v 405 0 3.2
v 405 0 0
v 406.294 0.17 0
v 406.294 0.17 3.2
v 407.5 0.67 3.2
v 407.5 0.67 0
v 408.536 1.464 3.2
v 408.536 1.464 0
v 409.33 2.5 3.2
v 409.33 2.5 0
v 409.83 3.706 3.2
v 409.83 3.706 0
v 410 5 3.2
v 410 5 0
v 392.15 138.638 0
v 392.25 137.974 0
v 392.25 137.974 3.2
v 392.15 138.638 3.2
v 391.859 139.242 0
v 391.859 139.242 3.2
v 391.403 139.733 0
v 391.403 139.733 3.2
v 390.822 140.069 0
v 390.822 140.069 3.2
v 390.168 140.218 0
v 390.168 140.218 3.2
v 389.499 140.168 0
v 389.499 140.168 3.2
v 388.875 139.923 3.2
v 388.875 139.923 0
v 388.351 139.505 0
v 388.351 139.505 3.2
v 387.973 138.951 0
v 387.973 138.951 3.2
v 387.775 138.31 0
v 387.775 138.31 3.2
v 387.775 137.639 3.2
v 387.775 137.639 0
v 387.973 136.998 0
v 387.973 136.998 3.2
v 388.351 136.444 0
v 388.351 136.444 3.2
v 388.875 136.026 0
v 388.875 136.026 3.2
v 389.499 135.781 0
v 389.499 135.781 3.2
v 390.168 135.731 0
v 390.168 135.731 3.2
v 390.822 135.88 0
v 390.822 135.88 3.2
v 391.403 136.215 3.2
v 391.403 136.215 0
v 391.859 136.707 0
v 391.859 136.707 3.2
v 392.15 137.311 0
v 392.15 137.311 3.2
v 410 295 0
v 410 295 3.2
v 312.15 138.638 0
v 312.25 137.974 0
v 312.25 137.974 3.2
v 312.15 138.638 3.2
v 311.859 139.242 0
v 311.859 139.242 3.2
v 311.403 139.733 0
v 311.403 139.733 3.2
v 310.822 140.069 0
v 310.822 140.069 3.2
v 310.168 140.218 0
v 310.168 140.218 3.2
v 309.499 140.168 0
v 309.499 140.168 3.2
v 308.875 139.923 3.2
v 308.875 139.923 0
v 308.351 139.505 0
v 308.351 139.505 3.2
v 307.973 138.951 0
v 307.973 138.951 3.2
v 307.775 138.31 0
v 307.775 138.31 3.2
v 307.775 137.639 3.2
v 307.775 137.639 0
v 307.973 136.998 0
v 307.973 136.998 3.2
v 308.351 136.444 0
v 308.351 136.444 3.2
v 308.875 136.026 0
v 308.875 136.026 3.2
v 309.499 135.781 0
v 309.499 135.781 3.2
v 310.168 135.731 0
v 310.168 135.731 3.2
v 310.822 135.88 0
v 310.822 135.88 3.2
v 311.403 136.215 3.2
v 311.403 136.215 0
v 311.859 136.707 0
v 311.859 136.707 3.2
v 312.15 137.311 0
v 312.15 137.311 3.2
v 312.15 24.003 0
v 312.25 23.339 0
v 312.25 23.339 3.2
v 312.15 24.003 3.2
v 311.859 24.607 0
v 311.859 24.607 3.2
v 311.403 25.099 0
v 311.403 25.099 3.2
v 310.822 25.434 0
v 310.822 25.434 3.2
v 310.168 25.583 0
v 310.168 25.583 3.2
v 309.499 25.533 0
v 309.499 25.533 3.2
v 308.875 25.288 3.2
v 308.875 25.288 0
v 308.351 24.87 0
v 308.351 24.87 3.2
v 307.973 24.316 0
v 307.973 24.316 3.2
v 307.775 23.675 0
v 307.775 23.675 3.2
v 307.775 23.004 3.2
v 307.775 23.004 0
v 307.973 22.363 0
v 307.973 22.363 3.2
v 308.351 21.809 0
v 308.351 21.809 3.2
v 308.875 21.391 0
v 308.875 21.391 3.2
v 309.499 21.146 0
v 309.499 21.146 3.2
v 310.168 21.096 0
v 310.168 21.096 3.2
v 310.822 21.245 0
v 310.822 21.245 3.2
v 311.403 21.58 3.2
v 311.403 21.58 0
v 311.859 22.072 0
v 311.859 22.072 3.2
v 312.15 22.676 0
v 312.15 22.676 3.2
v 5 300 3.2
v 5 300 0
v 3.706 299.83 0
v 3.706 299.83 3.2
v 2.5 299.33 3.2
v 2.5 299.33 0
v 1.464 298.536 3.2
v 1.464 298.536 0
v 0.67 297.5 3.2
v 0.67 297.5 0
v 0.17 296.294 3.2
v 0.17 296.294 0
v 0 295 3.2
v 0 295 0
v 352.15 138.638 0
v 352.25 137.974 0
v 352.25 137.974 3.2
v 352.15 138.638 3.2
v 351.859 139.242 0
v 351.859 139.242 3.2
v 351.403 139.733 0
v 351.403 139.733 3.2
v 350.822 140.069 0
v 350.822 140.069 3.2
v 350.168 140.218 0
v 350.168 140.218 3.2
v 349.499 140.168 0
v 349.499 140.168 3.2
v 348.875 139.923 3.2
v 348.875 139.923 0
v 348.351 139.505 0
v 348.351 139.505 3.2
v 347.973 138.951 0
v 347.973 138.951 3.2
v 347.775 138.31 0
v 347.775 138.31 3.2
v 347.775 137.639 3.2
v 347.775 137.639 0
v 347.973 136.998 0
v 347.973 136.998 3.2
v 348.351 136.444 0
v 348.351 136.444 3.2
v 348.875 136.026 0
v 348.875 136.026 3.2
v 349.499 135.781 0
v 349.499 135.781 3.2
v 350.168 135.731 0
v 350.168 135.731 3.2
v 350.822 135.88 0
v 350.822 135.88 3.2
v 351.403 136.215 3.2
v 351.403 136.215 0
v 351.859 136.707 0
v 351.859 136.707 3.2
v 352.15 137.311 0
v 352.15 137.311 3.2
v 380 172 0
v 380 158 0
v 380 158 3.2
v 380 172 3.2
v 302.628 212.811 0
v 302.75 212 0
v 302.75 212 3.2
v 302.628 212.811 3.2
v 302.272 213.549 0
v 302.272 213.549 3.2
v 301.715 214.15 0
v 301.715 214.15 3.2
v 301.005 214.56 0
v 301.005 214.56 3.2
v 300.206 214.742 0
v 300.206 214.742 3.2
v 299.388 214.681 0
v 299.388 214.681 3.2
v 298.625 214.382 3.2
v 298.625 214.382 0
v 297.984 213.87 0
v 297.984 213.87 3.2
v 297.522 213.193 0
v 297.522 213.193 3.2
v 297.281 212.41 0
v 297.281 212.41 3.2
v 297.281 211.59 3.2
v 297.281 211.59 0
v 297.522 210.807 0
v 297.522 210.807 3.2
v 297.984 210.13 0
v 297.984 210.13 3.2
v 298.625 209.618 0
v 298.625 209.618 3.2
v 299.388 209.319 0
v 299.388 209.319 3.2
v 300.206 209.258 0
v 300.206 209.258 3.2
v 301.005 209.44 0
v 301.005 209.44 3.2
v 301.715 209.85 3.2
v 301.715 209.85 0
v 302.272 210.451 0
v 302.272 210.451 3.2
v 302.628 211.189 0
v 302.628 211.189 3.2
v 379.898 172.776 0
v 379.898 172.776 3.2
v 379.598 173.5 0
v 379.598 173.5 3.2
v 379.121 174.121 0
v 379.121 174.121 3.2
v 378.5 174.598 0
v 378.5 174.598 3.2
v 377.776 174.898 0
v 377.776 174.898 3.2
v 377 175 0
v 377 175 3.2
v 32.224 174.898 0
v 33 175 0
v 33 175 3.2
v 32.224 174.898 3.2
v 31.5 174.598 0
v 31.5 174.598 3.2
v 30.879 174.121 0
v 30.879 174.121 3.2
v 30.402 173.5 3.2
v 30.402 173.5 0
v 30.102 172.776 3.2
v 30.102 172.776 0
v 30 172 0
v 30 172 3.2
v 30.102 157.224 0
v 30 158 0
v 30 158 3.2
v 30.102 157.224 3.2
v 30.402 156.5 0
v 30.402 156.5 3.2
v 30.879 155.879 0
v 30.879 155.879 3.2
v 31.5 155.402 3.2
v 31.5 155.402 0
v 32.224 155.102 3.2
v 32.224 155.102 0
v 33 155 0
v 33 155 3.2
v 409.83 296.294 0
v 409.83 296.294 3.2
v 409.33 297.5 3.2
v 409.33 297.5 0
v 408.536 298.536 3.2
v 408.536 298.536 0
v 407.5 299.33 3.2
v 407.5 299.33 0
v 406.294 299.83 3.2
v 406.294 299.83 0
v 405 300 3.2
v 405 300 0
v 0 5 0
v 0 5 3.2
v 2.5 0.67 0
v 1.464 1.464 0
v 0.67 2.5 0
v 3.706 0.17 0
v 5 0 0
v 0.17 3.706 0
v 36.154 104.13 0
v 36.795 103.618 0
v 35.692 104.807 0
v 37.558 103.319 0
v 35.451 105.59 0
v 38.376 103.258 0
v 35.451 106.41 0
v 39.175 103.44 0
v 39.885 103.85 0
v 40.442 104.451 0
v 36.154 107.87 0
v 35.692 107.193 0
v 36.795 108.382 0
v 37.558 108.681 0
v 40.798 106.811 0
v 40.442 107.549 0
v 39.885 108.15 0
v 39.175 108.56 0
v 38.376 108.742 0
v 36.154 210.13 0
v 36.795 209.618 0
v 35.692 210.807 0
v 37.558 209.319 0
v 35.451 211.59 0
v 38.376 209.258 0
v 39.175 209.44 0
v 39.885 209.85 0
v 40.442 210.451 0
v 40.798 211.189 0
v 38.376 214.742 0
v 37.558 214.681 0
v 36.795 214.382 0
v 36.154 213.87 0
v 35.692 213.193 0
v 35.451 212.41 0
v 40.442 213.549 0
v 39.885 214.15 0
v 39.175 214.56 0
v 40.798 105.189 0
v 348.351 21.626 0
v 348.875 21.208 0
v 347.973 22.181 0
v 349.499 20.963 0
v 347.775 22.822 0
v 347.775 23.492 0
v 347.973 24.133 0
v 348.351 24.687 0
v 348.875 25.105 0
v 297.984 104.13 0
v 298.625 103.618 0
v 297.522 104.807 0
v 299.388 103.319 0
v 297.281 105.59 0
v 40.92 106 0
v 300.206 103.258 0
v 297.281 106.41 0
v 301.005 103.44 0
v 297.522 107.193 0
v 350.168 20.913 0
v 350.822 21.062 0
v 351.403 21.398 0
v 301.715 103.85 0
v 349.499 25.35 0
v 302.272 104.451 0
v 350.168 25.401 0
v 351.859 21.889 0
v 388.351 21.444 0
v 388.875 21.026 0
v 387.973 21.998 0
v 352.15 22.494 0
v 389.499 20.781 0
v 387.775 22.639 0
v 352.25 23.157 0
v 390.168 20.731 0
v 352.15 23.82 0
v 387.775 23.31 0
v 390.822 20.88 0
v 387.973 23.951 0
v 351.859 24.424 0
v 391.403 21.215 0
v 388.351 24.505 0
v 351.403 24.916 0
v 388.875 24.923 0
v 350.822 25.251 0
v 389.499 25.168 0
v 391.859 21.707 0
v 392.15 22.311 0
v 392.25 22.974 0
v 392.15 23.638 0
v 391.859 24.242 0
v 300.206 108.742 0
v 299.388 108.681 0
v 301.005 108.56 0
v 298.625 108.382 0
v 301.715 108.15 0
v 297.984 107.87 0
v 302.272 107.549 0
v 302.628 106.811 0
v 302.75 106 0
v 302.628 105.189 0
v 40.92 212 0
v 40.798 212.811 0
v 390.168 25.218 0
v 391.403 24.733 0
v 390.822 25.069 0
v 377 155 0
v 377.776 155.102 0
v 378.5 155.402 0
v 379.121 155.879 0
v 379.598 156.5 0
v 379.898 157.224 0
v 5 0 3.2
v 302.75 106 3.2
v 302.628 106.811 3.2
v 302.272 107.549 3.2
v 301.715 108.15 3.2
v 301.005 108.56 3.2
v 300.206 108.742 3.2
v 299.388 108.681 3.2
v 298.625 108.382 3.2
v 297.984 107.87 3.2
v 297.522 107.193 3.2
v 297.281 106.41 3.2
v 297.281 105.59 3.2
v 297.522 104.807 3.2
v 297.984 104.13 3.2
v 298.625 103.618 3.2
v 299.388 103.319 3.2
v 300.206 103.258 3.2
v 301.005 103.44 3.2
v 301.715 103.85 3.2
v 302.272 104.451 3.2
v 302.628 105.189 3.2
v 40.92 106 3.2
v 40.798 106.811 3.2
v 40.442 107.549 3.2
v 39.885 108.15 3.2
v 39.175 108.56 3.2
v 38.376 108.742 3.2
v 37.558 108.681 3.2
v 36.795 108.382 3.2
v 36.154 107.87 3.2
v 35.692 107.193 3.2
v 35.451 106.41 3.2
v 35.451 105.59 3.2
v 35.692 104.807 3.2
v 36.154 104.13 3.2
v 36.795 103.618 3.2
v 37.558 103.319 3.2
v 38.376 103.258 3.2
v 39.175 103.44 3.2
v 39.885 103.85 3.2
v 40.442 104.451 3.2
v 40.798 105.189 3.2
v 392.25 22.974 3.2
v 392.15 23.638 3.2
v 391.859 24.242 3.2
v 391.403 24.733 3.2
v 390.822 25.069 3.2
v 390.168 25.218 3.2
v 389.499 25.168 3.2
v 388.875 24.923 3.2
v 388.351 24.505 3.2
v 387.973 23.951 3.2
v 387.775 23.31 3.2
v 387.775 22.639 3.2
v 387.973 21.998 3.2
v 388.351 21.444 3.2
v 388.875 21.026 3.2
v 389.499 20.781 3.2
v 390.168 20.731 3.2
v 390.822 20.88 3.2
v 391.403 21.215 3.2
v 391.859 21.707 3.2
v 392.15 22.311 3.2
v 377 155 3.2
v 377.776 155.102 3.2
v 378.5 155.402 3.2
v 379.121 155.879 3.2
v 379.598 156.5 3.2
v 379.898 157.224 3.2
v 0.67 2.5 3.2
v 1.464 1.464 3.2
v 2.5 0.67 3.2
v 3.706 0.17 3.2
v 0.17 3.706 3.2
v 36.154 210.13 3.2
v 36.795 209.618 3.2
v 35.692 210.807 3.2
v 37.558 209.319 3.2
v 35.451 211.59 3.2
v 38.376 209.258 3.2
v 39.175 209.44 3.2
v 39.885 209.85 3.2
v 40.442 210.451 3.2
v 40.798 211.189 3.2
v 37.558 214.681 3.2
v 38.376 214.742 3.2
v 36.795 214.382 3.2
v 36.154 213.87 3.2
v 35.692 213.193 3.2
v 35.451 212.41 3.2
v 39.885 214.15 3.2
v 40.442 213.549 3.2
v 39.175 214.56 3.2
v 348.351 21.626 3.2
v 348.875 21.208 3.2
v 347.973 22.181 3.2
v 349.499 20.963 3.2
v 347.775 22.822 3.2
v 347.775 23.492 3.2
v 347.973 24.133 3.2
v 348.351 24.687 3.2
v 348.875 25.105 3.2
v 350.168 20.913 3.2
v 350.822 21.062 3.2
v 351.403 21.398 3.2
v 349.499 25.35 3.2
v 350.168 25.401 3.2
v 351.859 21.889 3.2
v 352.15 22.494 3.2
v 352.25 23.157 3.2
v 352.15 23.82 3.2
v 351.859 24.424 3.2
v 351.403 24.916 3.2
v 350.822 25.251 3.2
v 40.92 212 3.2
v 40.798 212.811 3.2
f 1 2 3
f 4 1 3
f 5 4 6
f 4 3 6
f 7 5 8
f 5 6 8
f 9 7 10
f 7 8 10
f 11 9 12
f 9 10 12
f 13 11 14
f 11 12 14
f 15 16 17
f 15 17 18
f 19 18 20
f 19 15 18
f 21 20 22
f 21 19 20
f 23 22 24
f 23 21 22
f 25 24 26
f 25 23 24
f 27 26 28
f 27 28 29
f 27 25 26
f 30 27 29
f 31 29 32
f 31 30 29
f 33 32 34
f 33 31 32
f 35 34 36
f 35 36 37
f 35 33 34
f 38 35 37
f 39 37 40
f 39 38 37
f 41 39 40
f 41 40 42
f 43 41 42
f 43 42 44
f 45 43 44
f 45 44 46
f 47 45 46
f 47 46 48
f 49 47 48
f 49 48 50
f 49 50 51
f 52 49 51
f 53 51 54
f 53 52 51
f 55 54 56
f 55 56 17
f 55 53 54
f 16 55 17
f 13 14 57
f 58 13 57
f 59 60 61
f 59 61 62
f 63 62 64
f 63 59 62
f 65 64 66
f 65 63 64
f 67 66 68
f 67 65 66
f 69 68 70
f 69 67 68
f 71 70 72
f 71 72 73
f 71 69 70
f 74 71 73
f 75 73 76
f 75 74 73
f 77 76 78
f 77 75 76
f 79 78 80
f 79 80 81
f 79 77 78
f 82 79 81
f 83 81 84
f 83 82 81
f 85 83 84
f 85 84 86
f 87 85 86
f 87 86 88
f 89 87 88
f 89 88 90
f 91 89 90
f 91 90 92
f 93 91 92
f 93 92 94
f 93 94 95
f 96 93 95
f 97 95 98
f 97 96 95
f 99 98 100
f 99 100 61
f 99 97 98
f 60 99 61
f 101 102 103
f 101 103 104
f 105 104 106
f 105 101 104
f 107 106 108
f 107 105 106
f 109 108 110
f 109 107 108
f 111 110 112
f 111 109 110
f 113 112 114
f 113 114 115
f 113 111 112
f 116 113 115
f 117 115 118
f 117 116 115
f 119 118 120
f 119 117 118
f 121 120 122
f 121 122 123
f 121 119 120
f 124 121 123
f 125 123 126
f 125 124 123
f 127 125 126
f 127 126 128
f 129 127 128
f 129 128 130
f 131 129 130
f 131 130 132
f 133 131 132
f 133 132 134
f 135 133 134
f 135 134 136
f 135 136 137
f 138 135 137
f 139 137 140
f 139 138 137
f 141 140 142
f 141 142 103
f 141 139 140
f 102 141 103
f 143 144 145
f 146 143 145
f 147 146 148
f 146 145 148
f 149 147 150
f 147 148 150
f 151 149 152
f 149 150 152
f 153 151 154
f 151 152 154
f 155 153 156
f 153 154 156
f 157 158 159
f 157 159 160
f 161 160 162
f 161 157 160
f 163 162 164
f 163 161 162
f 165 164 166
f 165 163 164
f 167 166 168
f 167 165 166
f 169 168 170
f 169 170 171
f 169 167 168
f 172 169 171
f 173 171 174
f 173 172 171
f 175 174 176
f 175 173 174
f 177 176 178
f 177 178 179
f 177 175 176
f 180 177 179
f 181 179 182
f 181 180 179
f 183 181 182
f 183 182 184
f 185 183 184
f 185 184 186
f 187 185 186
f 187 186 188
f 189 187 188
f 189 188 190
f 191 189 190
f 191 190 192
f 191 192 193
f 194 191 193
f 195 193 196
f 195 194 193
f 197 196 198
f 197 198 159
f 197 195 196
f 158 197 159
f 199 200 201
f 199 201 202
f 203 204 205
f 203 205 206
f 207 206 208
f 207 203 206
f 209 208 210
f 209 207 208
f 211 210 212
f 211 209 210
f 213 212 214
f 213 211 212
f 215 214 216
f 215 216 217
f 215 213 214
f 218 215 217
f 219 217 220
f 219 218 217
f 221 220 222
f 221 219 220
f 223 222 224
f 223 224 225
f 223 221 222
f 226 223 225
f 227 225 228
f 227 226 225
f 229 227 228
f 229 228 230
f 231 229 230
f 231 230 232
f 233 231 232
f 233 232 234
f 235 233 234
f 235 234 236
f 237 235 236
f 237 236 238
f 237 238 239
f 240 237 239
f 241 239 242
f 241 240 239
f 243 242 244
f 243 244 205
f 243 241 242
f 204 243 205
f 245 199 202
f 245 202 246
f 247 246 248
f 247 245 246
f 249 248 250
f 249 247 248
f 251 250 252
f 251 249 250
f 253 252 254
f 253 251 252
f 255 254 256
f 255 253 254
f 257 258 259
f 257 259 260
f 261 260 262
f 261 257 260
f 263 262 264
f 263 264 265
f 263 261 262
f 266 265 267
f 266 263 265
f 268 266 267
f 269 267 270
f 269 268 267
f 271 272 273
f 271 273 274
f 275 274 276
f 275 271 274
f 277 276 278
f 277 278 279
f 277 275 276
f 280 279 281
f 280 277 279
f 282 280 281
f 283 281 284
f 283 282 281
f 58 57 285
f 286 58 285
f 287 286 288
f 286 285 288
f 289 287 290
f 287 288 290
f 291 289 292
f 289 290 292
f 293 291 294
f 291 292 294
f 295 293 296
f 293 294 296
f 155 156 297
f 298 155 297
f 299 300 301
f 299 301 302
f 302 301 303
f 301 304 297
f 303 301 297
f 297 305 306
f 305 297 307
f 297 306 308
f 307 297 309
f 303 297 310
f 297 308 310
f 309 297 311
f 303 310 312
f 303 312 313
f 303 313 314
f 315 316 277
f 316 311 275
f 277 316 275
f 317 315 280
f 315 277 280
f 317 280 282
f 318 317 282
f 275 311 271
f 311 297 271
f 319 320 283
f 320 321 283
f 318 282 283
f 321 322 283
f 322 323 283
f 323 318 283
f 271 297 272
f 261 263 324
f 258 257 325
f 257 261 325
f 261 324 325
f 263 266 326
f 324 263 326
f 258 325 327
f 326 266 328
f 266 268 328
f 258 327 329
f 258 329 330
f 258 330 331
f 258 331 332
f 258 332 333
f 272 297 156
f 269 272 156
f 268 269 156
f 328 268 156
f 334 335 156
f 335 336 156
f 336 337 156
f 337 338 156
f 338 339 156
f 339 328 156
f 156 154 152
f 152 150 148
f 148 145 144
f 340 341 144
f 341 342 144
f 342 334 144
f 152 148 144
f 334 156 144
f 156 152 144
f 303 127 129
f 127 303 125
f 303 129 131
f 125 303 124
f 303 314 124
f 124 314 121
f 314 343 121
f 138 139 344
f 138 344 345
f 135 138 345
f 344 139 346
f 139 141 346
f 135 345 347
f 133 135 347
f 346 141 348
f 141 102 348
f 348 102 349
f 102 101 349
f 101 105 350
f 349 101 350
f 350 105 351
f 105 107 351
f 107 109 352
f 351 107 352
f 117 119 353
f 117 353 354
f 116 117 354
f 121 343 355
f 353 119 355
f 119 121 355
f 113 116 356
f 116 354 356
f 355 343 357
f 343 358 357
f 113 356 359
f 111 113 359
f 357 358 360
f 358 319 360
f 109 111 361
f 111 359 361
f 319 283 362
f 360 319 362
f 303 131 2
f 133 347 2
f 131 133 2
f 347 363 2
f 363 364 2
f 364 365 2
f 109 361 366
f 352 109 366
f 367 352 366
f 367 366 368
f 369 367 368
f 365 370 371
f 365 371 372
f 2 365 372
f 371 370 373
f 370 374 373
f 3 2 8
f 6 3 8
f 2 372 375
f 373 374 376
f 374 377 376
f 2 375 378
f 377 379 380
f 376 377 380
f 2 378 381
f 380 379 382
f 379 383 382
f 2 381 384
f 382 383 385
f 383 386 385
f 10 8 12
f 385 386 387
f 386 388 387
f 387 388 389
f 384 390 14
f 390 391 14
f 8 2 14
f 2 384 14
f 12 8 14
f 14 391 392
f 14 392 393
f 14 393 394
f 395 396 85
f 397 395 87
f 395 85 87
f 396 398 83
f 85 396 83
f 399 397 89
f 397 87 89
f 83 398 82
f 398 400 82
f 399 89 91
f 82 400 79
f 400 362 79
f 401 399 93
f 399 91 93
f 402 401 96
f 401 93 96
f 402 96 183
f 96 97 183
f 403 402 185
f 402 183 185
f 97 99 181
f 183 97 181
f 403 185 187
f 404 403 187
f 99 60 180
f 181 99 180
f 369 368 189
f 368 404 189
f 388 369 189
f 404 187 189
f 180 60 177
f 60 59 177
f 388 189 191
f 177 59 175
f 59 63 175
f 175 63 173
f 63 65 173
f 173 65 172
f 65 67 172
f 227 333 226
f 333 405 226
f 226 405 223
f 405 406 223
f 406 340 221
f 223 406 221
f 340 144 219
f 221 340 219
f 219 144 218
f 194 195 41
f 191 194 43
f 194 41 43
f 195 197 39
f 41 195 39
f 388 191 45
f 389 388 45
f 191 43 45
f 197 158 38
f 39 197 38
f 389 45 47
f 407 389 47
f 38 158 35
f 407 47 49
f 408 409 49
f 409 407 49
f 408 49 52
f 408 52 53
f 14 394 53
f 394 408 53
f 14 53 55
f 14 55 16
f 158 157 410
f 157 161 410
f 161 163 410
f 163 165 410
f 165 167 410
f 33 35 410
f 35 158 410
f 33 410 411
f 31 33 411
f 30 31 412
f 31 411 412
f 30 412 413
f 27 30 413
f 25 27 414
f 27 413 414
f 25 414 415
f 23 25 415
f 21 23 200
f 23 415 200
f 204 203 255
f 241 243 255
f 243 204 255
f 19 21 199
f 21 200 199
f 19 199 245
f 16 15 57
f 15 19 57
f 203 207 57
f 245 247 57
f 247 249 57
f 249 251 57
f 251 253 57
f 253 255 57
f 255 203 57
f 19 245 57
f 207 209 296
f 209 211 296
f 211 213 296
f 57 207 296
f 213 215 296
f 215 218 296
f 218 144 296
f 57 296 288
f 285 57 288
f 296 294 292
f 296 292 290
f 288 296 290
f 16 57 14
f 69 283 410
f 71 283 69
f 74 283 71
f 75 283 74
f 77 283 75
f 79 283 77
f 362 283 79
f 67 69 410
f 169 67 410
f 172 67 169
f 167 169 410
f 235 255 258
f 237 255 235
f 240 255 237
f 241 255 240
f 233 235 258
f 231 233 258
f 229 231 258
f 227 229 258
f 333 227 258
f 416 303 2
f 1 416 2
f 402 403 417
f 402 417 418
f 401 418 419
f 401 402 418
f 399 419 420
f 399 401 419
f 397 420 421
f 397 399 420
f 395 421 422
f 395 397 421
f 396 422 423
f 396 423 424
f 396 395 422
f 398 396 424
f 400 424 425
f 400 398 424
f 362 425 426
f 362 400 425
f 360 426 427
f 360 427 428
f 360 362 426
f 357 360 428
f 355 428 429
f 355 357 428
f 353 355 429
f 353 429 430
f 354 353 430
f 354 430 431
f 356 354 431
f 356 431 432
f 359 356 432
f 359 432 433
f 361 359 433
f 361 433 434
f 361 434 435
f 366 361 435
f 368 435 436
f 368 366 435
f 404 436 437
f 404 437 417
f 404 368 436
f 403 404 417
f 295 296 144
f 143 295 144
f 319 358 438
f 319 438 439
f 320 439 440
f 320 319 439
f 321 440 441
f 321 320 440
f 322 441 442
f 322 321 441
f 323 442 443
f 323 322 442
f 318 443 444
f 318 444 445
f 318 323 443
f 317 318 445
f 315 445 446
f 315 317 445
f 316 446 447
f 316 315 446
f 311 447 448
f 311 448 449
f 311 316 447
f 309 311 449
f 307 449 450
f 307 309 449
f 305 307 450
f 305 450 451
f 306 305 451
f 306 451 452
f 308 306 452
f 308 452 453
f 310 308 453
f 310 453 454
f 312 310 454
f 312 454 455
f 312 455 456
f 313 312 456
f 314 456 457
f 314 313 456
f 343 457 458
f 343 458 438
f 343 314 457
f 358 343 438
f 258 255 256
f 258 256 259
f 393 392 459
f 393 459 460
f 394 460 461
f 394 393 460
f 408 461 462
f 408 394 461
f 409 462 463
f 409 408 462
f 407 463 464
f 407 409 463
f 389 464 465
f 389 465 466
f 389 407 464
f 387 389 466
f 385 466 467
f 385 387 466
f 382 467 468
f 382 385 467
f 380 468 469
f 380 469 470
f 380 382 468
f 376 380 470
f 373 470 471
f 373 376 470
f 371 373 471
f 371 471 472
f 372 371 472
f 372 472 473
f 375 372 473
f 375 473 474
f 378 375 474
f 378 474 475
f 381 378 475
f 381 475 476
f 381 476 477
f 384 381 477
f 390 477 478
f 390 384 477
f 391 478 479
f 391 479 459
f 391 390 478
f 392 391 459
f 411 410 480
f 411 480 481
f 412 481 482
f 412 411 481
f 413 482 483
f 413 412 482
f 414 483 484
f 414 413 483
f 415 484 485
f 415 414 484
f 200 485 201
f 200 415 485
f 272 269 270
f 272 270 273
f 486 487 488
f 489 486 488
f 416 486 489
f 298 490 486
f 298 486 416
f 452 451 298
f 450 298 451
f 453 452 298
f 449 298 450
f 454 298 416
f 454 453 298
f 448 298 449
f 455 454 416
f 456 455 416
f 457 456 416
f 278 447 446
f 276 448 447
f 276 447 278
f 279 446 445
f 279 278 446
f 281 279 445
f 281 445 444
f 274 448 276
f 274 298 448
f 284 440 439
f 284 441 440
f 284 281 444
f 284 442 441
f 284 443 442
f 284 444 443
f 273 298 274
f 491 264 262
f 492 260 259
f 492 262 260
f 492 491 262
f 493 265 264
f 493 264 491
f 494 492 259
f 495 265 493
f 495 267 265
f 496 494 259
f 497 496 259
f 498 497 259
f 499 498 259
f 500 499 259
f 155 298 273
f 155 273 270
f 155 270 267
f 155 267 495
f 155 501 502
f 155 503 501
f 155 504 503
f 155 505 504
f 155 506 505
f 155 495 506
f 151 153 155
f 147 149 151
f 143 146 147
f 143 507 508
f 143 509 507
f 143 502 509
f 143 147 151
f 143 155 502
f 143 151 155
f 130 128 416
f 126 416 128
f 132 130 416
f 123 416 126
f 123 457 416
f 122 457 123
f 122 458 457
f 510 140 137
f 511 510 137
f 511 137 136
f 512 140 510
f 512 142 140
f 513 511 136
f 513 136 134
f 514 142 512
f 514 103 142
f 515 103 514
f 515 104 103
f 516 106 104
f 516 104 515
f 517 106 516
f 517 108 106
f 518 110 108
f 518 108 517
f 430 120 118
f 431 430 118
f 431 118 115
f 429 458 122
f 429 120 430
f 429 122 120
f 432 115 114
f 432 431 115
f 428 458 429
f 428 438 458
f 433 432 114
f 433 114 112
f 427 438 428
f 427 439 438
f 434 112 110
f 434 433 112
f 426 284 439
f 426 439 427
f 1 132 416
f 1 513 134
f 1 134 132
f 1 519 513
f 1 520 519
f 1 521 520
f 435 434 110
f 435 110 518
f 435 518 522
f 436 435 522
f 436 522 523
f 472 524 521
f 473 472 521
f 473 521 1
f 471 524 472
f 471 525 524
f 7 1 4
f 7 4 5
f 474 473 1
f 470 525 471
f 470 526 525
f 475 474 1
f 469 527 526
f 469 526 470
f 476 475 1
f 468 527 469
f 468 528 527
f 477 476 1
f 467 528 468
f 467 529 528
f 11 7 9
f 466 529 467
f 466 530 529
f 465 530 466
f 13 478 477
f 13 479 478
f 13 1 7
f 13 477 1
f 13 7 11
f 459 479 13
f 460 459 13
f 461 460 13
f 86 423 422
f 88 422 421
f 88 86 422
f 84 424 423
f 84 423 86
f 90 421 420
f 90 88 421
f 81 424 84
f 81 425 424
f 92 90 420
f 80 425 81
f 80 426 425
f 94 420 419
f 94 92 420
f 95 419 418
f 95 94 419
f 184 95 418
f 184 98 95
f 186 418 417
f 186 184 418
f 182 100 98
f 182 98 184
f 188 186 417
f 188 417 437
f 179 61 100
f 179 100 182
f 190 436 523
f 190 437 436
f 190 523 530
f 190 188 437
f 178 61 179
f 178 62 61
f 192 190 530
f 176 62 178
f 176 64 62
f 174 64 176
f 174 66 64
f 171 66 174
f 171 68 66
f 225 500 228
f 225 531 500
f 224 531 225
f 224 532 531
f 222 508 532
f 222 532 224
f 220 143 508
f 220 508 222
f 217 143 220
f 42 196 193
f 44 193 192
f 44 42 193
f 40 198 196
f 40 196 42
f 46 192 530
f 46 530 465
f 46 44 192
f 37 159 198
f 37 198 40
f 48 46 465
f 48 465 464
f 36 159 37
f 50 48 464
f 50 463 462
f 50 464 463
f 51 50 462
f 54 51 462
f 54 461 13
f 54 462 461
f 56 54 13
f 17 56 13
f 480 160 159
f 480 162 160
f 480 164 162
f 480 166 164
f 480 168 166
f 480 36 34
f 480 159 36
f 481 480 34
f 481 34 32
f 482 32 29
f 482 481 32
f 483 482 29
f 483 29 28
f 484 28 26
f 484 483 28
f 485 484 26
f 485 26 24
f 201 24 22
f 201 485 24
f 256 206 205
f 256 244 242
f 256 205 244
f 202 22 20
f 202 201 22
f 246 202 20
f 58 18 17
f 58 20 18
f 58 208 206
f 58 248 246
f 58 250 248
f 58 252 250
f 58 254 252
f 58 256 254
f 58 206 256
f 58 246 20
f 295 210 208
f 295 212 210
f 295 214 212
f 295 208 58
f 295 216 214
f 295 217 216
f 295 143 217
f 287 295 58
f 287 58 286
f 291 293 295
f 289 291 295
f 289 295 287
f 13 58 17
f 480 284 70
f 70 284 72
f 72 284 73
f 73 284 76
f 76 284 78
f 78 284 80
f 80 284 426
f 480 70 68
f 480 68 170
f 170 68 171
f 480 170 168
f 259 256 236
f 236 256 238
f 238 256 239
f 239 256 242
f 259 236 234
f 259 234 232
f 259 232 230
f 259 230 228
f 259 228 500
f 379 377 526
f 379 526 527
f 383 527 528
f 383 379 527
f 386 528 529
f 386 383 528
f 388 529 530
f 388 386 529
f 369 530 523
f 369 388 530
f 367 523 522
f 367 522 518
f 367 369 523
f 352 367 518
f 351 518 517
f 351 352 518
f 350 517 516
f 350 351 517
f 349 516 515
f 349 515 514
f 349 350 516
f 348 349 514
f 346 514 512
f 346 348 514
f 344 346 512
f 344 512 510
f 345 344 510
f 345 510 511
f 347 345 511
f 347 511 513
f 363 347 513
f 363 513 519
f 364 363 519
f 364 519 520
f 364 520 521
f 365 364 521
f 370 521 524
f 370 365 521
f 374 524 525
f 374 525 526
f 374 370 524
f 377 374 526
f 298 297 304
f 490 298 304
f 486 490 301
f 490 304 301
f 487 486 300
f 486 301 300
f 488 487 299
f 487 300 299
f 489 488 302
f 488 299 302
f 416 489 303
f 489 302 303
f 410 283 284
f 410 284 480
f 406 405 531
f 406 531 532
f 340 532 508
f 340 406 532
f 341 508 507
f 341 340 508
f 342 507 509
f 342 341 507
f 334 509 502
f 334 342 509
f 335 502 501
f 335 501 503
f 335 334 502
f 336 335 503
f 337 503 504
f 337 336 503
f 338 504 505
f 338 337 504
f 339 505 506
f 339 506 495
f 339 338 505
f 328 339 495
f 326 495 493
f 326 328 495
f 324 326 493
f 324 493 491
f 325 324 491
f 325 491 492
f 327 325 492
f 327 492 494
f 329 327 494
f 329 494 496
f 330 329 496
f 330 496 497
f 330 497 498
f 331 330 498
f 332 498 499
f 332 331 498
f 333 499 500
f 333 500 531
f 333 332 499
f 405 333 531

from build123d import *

# Parameters (mm, degrees)
SKETCH1_R           = 2.25
SKETCH1_R_2         = 2.75
BOSS_EXTRUDE1_DEPTH = 3.2


with BuildPart() as part:
    # Sketch1 → Boss-Extrude1 (new body)
    with BuildSketch(Plane.XY):
        with BuildLine():
            Line((5, 0), (405, 0))
            ThreePointArc((405, 0), (408.535533906, 1.464466094), (410, 5))
            Line((410, 5), (410, 295))
            ThreePointArc((410, 295), (408.535533906, 298.535533906), (405, 300))
            Line((405, 300), (5, 300))
            ThreePointArc((5, 300), (1.464466094, 298.535533906), (0, 295))
            Line((0, 295), (0, 5))
            ThreePointArc((0, 5), (1.464466094, 1.464466094), (5, 0))
        make_face()
        with Locations((310, 23.339430176)):
            Circle(SKETCH1_R, mode=Mode.SUBTRACT)
        with Locations((350, 23.156887411)):
            Circle(SKETCH1_R, mode=Mode.SUBTRACT)
        with Locations((390, 22.974344646)):
            Circle(SKETCH1_R, mode=Mode.SUBTRACT)
        with Locations((310, 137.974344646)):
            Circle(SKETCH1_R, mode=Mode.SUBTRACT)
        with Locations((350, 137.974344646)):
            Circle(SKETCH1_R, mode=Mode.SUBTRACT)
        with Locations((390, 137.974344646)):
            Circle(SKETCH1_R, mode=Mode.SUBTRACT)
        with Locations((300, 106)):
            Circle(SKETCH1_R_2, mode=Mode.SUBTRACT)
        with Locations((38.17, 106)):
            Circle(SKETCH1_R_2, mode=Mode.SUBTRACT)
        with Locations((38.17, 212)):
            Circle(SKETCH1_R_2, mode=Mode.SUBTRACT)
        with Locations((300, 212)):
            Circle(SKETCH1_R_2, mode=Mode.SUBTRACT)
        with BuildLine():
            Line((33, 155), (377, 155))
            ThreePointArc((377, 155), (379.121320344, 155.878679656), (380, 158))
            Line((380, 158), (380, 172))
            ThreePointArc((380, 172), (379.121320344, 174.121320344), (377, 175))
            Line((377, 175), (33, 175))
            ThreePointArc((33, 175), (30.878679656, 174.121320344), (30, 172))
            Line((30, 172), (30, 158))
            ThreePointArc((30, 158), (30.878679656, 155.878679656), (33, 155))
        make_face(mode=Mode.SUBTRACT)
    extrude(amount=BOSS_EXTRUDE1_DEPTH)


solid = part.part
